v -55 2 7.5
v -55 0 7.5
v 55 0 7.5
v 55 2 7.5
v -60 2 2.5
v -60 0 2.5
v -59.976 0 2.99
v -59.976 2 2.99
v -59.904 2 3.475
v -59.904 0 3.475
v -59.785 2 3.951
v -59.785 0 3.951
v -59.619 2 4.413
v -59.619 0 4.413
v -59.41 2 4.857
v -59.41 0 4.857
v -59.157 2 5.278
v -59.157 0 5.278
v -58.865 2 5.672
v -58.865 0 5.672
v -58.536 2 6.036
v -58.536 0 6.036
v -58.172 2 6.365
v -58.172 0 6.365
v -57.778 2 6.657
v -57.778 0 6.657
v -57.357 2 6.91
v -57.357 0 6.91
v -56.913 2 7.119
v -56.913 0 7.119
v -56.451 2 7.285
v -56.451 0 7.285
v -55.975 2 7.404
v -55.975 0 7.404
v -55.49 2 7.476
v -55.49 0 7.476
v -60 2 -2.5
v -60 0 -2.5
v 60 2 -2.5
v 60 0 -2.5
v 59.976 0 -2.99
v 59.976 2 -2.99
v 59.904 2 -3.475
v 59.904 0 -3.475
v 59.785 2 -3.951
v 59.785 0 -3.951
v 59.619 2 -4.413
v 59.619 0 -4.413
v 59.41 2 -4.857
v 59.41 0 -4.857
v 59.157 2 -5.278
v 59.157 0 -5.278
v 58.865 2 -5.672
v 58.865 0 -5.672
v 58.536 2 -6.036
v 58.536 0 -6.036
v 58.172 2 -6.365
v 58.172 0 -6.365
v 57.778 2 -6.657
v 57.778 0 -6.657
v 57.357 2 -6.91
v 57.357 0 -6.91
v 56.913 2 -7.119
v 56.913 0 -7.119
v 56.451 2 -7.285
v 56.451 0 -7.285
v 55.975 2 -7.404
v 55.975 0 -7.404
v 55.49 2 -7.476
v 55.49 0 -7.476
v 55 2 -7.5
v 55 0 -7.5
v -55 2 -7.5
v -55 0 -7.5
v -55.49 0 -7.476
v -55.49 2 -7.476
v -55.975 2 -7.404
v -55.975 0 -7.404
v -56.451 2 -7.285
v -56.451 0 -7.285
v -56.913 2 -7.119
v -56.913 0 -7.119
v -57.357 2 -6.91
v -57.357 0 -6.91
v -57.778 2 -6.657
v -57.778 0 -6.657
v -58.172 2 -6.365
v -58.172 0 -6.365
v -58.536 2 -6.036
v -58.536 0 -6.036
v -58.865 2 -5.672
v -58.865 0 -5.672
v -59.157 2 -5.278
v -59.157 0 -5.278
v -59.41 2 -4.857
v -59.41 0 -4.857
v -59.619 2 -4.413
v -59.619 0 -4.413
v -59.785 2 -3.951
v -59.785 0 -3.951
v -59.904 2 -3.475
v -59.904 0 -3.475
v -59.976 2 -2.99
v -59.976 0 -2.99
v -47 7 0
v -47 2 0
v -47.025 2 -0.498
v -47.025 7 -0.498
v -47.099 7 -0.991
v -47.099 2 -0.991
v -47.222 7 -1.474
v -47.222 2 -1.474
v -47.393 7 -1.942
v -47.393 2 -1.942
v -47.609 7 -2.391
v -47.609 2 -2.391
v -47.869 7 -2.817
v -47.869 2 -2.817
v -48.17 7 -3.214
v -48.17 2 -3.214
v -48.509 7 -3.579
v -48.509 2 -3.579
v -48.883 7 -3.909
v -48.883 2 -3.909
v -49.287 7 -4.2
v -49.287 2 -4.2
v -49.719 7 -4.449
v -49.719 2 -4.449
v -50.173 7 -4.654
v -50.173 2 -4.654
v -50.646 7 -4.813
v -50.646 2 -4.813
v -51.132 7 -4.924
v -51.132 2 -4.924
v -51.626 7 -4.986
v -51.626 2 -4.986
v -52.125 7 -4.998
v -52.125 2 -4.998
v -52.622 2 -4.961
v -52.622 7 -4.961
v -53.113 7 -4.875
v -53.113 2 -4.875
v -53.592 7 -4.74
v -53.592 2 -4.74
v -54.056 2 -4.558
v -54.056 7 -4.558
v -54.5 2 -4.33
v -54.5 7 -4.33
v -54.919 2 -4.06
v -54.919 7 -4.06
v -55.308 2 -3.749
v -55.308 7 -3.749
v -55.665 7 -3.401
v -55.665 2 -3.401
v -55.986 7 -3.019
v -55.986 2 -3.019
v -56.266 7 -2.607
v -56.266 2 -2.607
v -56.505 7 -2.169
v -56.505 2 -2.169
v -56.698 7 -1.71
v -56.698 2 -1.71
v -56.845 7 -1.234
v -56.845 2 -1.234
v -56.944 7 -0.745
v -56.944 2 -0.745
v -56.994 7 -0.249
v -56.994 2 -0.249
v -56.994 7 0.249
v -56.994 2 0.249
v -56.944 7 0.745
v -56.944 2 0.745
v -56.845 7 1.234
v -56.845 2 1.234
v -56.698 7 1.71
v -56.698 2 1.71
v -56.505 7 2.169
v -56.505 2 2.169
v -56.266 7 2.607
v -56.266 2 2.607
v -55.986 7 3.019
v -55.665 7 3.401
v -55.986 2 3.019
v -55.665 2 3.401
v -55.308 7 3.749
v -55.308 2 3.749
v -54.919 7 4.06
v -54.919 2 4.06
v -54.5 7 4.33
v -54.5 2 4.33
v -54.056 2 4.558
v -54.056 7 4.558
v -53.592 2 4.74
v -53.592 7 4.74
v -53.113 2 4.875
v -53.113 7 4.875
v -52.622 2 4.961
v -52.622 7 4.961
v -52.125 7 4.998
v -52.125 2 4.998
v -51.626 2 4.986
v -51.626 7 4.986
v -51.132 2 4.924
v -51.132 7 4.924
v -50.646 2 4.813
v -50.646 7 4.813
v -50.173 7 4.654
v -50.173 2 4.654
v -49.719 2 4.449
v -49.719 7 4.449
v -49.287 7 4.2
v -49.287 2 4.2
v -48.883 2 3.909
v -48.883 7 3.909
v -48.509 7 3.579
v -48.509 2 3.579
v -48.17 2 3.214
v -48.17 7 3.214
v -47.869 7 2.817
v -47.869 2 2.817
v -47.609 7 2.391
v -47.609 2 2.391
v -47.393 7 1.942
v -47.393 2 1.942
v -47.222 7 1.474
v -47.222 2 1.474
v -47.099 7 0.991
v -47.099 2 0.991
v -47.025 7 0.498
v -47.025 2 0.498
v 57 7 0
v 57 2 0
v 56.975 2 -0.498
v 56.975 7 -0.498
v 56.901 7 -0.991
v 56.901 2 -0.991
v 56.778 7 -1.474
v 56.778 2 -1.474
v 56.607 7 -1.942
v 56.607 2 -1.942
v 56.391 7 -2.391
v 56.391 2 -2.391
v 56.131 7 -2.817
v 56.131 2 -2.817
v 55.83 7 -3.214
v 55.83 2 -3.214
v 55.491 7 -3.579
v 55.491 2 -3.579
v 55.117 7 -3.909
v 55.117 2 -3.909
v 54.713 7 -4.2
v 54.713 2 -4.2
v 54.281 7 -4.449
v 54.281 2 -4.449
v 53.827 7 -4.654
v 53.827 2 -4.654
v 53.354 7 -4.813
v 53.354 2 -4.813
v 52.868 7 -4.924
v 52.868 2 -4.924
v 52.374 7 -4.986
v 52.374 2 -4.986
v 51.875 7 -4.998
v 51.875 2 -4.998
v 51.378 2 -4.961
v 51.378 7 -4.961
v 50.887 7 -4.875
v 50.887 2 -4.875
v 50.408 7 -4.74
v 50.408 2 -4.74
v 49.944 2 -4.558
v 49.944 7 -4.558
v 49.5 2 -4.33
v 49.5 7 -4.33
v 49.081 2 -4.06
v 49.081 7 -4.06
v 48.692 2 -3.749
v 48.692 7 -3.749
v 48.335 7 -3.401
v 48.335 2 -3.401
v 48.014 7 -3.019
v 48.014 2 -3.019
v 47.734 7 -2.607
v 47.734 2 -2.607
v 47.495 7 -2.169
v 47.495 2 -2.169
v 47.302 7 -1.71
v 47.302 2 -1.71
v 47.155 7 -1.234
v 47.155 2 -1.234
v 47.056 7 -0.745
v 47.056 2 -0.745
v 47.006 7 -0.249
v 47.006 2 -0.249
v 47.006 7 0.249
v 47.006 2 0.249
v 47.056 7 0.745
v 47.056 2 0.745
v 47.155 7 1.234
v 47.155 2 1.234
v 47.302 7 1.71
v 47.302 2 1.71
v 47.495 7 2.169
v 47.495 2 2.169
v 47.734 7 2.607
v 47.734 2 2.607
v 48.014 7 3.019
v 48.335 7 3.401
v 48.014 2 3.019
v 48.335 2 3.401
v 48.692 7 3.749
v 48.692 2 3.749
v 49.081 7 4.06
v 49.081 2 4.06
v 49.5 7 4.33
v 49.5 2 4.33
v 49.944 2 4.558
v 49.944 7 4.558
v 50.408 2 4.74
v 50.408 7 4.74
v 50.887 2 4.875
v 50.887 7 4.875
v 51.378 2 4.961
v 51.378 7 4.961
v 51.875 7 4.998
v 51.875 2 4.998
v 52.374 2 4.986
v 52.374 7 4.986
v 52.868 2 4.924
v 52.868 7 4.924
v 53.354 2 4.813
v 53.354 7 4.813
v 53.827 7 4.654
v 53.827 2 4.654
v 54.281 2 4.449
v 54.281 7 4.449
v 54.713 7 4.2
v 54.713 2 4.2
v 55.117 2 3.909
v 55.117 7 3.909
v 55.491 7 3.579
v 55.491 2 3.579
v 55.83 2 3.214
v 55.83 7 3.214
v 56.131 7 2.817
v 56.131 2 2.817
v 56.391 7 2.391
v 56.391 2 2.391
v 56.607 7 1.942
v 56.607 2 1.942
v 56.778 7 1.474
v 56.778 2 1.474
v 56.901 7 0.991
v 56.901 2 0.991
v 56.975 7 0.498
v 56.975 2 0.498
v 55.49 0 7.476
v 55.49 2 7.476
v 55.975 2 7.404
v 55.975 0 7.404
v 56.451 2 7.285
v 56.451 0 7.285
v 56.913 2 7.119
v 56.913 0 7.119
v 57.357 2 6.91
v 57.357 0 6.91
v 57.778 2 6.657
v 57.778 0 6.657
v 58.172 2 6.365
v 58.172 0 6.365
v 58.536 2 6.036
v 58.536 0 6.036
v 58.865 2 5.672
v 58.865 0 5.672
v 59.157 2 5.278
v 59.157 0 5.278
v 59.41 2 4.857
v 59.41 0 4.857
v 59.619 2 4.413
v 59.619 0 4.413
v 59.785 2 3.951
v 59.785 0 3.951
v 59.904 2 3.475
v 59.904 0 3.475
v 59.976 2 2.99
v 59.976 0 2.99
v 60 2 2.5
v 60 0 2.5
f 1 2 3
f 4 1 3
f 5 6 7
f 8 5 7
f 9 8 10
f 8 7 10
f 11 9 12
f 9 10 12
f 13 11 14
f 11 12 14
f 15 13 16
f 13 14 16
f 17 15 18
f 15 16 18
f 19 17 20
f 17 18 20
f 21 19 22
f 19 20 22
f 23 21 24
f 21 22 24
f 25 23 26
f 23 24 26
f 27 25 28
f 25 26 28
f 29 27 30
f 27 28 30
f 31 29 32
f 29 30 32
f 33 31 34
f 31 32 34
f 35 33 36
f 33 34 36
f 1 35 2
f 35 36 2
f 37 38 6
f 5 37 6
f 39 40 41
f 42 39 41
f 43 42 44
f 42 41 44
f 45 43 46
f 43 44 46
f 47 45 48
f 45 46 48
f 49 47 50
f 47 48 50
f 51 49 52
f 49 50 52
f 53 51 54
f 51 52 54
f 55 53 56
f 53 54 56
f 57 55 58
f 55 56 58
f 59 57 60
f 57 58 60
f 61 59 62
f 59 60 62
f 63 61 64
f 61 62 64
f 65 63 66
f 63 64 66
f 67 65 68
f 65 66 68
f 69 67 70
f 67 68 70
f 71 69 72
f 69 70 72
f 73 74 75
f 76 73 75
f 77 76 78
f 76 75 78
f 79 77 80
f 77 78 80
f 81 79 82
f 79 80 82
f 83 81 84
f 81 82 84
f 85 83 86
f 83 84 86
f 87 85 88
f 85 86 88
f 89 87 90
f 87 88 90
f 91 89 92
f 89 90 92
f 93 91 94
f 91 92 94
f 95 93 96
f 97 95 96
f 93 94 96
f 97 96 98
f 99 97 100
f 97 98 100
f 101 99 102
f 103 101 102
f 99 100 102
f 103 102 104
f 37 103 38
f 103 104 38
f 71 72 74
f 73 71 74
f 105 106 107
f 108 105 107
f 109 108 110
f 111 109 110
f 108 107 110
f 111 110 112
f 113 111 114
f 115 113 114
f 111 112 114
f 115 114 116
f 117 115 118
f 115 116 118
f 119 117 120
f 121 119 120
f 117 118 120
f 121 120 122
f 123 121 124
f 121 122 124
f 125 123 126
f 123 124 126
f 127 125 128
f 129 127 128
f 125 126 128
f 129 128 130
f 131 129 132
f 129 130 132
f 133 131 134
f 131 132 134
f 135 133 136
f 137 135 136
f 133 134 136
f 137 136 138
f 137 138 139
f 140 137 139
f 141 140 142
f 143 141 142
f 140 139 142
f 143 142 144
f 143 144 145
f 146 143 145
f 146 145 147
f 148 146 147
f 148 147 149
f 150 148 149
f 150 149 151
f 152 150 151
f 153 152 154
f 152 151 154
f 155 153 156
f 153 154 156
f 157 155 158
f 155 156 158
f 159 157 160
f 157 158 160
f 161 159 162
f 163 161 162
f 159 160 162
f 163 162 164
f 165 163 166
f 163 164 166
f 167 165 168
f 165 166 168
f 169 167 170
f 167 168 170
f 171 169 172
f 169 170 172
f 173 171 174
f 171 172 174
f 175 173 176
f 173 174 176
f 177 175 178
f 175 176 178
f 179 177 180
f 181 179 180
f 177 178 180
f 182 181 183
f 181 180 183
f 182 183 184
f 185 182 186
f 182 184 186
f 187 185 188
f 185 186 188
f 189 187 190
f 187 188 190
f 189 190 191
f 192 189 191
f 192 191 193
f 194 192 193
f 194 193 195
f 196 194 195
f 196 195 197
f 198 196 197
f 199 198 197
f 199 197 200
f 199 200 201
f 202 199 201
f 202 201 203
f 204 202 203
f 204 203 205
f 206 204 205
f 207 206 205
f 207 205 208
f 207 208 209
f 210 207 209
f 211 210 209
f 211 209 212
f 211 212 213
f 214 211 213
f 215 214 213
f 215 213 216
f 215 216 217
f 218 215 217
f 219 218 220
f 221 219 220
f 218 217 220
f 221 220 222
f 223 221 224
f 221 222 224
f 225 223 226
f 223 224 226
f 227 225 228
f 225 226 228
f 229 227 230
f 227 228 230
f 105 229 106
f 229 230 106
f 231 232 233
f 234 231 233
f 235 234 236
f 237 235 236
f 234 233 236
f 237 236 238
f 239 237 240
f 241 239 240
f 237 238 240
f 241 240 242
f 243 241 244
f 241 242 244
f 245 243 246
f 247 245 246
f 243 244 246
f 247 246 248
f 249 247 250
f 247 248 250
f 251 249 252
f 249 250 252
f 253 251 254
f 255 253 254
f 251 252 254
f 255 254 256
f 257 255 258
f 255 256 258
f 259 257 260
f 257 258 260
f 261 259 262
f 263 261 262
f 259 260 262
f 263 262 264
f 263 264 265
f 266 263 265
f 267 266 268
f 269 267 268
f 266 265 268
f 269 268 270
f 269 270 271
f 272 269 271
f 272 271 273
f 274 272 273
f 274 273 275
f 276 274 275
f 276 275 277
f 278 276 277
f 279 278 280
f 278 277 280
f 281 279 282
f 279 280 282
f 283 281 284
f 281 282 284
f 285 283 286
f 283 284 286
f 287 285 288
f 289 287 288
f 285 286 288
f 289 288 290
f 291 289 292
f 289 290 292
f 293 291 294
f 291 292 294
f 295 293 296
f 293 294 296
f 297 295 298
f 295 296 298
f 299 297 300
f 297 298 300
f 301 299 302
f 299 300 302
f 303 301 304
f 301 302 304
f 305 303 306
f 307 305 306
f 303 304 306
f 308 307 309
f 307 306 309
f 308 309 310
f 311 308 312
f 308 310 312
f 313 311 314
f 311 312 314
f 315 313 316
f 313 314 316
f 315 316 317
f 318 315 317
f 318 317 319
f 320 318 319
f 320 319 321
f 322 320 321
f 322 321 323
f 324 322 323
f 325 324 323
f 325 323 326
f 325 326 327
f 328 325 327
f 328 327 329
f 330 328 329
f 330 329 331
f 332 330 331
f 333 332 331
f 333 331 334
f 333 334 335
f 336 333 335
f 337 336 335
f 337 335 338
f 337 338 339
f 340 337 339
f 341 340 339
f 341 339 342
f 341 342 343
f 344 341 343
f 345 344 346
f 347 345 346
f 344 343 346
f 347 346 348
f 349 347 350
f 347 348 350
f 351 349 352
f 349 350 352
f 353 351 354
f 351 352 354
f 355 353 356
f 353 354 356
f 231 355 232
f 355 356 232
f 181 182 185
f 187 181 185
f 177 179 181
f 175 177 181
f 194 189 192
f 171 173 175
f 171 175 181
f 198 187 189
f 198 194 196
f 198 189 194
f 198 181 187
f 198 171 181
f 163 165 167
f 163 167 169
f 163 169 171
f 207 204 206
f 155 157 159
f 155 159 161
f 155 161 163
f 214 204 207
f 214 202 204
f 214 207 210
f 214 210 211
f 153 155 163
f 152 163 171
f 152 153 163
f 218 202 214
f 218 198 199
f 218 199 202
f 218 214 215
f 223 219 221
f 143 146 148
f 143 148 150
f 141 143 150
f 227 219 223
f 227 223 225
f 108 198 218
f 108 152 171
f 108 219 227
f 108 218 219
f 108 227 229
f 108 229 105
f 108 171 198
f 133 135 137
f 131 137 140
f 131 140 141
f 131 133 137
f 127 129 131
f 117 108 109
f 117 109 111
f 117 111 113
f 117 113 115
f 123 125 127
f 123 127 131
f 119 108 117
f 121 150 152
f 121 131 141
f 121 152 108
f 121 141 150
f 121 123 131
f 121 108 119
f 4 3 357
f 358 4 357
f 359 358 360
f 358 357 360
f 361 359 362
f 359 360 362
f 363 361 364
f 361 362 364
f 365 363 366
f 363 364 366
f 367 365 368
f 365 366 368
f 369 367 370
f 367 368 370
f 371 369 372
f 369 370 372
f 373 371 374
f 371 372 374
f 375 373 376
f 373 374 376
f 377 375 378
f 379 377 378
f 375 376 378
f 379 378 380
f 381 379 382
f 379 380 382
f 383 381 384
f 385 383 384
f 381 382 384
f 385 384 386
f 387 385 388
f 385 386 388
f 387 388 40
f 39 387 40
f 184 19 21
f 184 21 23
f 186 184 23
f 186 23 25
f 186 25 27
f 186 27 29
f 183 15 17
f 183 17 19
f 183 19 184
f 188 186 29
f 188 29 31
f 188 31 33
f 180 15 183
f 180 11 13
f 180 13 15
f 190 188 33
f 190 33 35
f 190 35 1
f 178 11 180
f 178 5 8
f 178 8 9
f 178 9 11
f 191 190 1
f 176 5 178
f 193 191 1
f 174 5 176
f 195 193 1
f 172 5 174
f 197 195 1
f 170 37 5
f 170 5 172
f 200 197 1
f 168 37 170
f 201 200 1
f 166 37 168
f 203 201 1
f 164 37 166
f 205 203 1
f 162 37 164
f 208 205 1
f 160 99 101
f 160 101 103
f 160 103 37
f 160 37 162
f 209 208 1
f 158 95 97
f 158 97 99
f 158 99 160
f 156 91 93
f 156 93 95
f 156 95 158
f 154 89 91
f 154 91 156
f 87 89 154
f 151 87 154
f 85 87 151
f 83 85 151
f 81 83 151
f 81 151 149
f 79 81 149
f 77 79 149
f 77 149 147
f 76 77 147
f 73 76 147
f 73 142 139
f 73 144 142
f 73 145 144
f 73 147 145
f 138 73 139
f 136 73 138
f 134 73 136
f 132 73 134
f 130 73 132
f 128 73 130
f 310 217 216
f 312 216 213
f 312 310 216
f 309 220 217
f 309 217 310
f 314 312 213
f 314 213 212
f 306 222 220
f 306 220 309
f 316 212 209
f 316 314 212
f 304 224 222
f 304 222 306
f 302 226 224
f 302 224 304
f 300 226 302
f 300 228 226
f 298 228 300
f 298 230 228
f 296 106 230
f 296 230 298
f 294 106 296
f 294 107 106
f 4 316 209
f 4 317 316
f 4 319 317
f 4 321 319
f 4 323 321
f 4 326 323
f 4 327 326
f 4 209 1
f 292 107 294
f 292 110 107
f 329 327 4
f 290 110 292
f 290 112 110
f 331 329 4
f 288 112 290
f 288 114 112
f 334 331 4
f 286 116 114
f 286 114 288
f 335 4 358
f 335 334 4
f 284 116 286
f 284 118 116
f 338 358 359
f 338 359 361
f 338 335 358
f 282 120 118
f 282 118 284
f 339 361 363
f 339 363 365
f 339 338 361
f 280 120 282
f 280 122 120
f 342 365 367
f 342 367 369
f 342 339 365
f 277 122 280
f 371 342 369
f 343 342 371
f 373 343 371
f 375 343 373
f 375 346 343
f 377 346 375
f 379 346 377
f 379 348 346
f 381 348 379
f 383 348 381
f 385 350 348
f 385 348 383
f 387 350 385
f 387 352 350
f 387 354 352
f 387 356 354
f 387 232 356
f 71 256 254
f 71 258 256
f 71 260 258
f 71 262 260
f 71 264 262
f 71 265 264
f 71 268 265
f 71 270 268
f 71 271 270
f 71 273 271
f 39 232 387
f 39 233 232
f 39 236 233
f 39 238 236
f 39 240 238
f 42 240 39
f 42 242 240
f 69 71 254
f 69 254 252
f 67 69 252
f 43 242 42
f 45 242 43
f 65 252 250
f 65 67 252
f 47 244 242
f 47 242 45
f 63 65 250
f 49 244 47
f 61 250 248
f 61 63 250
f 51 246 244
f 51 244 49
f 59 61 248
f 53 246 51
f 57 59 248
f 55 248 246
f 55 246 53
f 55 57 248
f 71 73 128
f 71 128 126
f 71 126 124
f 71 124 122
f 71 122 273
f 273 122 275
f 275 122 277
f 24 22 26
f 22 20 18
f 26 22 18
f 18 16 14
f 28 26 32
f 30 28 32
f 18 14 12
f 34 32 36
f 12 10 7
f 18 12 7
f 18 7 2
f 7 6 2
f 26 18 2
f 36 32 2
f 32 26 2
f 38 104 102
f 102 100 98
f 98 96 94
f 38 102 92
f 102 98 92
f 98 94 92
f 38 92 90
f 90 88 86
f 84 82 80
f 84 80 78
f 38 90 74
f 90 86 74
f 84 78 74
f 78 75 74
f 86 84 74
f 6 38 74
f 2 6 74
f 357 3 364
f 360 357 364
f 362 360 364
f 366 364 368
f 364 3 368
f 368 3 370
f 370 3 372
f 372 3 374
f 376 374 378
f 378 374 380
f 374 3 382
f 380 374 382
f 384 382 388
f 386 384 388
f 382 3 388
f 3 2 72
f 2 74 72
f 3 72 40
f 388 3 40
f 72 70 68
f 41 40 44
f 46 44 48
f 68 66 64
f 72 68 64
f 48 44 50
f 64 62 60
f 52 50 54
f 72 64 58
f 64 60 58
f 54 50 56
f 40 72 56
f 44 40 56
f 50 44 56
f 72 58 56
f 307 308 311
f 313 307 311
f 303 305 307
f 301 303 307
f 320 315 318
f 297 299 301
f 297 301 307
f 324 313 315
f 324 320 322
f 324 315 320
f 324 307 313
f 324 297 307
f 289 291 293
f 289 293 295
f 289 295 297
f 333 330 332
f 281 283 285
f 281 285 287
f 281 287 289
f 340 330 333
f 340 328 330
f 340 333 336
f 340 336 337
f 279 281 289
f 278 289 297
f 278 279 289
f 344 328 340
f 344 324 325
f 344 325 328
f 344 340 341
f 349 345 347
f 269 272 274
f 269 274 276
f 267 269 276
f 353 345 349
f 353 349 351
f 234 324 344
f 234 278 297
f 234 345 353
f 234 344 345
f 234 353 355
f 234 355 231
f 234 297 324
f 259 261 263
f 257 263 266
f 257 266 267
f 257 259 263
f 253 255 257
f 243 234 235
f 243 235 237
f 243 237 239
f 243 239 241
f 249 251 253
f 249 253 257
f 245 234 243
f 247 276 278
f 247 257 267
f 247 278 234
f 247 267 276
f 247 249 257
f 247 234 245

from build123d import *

# Parameters (mm, degrees)
BOSS_EXTRUDE2_DEPTH = 2
SKETCH3_R           = 5
BOSS_EXTRUDE3_DEPTH = 5


with BuildPart() as part:
    # Sketch1 → Boss-Extrude2 (new body)
    with BuildSketch(Plane(origin=(0, 0, 0), x_dir=(1, 0, 0), z_dir=(0, 1, 0))):
        with BuildLine():
            Line((-55, -7.5), (55, -7.5))
            ThreePointArc((55, -7.5), (58.535533906, -6.035533906), (60, -2.5))
            Line((60, -2.5), (60, 2.5))
            ThreePointArc((60, 2.5), (58.535533906, 6.035533906), (55, 7.5))
            Line((55, 7.5), (-55, 7.5))
            ThreePointArc((-55, 7.5), (-58.535533906, 6.035533906), (-60, 2.5))
            Line((-60, 2.5), (-60, -2.5))
            ThreePointArc((-60, -2.5), (-58.535533906, -6.035533906), (-55, -7.5))
        make_face()
    extrude(amount=BOSS_EXTRUDE2_DEPTH)

    # Sketch3 → Boss-Extrude3 (add)
    with BuildSketch(Plane(origin=(0, 2, 0), x_dir=(1, 0, 0), z_dir=(0, 1, 0))):
        with Locations((52, 0)):
            Circle(SKETCH3_R)
        with Locations((-52, 0)):
            Circle(SKETCH3_R)
    extrude(amount=BOSS_EXTRUDE3_DEPTH)


solid = part.part
